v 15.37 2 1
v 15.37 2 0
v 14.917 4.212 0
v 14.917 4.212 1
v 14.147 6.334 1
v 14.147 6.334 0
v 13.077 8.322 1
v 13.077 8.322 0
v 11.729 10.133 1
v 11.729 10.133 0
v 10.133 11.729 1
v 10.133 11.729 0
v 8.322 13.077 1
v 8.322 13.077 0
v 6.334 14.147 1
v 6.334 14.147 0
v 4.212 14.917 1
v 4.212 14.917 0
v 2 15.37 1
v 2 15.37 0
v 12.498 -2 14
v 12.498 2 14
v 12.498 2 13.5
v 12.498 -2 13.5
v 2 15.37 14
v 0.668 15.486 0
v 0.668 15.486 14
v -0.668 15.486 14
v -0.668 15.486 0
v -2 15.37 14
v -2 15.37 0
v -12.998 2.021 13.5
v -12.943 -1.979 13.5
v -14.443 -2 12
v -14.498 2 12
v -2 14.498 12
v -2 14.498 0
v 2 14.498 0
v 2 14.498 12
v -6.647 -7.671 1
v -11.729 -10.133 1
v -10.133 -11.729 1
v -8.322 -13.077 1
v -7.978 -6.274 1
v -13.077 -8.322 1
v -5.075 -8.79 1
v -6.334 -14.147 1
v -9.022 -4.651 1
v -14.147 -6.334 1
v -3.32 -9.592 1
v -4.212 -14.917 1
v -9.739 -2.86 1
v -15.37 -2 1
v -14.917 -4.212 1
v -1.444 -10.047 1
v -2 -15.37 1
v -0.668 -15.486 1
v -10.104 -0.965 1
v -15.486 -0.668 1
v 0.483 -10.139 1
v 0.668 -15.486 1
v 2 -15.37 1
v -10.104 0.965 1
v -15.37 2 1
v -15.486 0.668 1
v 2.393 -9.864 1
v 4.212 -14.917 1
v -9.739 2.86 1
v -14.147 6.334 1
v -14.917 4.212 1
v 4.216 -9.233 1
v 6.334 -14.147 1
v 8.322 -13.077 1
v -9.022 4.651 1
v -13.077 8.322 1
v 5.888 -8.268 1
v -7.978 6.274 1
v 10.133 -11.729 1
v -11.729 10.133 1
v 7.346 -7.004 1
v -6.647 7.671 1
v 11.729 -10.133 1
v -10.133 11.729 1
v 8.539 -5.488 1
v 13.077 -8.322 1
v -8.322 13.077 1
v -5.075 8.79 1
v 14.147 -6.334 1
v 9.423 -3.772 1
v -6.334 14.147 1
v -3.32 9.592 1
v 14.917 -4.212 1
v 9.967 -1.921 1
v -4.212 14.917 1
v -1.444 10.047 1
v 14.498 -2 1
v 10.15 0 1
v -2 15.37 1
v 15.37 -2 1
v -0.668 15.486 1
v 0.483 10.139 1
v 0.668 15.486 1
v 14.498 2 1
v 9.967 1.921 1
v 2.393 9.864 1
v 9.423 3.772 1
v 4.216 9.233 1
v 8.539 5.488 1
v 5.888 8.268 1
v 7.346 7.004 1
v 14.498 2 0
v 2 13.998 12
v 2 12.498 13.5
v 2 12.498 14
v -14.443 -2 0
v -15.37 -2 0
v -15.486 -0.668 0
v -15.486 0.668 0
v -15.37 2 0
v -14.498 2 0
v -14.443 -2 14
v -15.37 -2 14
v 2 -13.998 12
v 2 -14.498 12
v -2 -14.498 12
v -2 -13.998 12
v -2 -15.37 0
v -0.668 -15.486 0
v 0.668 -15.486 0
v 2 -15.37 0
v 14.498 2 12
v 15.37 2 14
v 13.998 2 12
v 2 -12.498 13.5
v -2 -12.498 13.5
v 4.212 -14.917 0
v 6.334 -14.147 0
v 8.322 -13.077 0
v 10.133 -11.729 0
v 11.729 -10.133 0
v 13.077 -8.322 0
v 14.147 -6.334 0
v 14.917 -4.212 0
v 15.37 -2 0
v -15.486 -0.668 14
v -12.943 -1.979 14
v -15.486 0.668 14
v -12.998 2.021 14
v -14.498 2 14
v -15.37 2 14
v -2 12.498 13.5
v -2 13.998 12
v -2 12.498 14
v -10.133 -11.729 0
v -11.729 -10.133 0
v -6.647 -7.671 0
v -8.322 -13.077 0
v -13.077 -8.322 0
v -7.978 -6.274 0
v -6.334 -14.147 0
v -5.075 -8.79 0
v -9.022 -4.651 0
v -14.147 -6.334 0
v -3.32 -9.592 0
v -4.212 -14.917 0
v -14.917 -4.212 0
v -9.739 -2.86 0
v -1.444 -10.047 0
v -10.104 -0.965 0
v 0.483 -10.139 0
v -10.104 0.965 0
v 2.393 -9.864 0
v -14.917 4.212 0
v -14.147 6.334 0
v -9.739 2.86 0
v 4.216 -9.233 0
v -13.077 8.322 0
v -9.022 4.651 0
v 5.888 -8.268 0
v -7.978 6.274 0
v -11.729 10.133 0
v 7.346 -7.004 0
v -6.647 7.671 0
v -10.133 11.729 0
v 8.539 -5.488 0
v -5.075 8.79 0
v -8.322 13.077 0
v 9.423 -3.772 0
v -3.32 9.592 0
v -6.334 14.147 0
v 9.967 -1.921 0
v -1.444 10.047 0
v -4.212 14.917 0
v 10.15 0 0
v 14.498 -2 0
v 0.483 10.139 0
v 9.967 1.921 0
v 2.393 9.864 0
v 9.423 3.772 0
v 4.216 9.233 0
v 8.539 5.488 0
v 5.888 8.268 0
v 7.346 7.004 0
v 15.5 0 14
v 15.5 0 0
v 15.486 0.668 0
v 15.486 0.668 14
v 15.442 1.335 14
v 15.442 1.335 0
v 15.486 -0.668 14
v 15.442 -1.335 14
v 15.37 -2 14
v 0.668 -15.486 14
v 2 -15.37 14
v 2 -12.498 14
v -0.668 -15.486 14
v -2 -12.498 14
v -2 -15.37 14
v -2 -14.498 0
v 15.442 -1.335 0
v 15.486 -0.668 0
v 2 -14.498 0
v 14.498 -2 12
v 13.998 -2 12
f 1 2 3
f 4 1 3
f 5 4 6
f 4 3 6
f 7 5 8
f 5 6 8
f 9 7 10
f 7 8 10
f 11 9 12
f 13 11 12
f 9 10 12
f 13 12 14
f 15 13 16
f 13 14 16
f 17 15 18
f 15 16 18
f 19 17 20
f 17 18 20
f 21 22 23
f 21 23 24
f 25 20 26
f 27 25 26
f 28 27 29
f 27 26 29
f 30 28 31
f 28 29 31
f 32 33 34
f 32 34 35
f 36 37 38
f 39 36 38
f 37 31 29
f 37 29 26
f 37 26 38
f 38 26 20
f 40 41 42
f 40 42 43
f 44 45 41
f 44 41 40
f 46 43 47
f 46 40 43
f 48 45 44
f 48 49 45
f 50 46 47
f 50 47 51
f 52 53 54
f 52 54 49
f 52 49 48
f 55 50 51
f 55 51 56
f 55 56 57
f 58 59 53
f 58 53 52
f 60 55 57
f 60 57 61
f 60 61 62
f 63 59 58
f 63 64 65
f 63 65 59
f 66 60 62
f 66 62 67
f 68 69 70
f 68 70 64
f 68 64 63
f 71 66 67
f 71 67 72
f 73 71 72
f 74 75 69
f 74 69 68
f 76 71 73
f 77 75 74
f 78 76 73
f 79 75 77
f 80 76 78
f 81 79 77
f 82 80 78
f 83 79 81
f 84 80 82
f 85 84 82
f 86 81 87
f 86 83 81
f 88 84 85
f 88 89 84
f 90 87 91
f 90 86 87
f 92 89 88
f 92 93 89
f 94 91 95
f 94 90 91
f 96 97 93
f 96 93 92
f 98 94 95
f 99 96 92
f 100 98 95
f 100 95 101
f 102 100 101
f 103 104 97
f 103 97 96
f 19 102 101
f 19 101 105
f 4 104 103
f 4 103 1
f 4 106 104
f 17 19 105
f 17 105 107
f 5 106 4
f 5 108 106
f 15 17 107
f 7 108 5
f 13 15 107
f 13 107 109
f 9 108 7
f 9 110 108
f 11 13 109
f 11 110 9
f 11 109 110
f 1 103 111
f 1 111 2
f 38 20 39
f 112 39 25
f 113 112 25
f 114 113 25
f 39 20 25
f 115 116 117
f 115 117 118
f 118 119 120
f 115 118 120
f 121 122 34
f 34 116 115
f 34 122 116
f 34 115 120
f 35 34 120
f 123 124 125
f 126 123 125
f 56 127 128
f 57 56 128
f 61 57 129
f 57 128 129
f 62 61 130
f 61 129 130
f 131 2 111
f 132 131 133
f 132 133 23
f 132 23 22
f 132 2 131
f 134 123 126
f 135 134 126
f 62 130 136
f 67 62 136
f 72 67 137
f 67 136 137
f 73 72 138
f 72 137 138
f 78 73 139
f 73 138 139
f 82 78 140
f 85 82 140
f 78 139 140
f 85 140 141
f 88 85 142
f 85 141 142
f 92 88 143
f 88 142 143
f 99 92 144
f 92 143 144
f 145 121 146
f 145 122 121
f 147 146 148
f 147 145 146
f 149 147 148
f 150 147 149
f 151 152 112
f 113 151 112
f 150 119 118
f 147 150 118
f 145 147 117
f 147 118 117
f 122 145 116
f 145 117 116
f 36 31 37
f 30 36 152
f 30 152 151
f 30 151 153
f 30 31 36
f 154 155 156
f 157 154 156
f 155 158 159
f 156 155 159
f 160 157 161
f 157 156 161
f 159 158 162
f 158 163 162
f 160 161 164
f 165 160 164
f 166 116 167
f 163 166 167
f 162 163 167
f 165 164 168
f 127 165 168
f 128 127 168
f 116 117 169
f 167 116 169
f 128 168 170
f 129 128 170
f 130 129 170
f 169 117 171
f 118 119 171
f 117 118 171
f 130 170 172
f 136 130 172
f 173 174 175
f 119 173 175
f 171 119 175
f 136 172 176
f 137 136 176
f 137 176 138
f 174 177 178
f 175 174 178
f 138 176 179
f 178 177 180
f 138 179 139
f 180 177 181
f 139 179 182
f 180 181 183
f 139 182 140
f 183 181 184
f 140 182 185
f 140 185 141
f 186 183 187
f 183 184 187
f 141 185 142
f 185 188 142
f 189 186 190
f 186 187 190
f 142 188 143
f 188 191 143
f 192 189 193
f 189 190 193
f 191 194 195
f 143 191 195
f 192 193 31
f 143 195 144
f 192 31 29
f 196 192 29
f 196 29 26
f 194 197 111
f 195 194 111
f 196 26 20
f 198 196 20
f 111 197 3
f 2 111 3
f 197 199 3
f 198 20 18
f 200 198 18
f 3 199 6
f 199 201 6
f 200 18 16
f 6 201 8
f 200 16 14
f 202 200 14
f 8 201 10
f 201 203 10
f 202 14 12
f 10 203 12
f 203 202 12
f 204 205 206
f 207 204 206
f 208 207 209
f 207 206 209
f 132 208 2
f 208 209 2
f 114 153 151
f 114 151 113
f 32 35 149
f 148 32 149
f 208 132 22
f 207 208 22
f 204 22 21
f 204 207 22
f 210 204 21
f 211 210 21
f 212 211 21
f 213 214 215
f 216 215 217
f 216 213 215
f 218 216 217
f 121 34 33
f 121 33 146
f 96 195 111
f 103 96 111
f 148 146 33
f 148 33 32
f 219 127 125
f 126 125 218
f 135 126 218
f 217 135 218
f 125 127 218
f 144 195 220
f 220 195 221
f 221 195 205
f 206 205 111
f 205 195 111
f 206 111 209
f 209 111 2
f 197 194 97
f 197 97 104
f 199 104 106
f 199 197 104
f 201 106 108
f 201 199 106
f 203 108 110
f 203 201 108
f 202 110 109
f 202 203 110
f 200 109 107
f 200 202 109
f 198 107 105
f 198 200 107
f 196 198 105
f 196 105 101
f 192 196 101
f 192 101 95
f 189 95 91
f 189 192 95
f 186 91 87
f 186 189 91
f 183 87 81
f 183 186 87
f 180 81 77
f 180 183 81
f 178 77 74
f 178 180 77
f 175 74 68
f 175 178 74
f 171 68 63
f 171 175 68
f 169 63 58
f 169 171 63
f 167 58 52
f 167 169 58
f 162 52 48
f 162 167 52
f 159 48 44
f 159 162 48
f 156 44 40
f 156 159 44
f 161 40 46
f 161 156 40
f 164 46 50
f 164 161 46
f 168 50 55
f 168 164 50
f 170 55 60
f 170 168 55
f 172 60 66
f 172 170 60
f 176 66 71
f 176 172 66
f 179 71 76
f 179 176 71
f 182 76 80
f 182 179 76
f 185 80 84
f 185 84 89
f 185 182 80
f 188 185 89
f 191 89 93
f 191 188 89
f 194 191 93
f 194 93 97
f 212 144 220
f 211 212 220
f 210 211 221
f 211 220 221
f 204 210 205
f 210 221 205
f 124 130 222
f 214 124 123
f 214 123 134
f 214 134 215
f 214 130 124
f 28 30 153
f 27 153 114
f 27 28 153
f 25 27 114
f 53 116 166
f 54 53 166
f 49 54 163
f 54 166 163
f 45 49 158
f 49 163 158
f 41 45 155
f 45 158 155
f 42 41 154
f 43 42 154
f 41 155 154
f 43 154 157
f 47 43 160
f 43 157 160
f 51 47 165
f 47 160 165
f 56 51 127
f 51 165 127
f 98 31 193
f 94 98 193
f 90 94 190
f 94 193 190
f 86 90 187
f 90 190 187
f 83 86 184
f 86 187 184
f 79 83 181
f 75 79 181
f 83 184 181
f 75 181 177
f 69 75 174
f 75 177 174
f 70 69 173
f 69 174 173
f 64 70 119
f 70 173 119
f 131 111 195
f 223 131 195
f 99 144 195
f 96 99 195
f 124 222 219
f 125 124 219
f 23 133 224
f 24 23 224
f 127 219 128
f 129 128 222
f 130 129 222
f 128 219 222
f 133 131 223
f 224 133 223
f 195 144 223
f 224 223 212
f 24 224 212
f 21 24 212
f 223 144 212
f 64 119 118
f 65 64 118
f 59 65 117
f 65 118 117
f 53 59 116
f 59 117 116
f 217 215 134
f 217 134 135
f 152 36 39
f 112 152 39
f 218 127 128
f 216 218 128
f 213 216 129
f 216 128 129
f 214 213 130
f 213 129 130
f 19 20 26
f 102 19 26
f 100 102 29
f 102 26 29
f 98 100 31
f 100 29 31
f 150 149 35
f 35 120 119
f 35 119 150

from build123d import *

# Parameters (mm, degrees)
F1_DEPTH  = 14
F0_R      = 10.15
F2_DEPTH  = 1
F3_W      = 4
F3_H      = 2
F4_DEPTH  = 2
F5_SIZE   = 1.5
F6_W      = 4
F6_H      = 2
F7_DEPTH  = 2
F8_SIZE   = 1.5
F9_W      = 4.0003886693
F9_H      = 2
F10_DEPTH = 1.5
F11_SIZE  = 1.49999
F12_W     = 4
F12_H     = 2
F13_DEPTH = 2
F14_SIZE  = 1.5


# Not quite as in the source:
# - a fillet or chamfer is up to 0.001 mm smaller than in the source, because OpenCascade refuses the exact size
# - a feature names something its author has since deleted; it is built from what else it names


with BuildPart() as f1:
    # F0 (on Top) → F1 (new body)
    with BuildSketch(Plane.XY):
        with BuildLine():
            Line((-14.4982938511, 2), (-15.3704261489, 2))
            ThreePointArc((-15.3704261489, 2), (-15.5, 0), (-15.3704261489, -2))
            Line((-15.3704261489, -2), (-14.4425309095, -2))
            Line((-14.4425309095, -2), (-14.4982938511, 2))
        make_face()
    extrude(amount=F1_DEPTH)

    # F9 (on face) → F10 (join)
    with BuildSketch(Plane(origin=(-14.4676006874, -0.2016889929, 0), x_dir=(-0.0139393809, 0.9999028421, 0), z_dir=(0.9999028421, 0.0139393809, 0))):
        with Locations((0.2017085905, 13)):
            Rectangle(F9_W, F9_H)
    extrude(amount=F10_DEPTH)

    # F11 (size 1.5 in the source; OpenCascade refuses exactly that, so slightly less here)
    f11_edges = [f1.edges().sort_by_distance(p)[0] for p in [
        (-12.970558, 0.020909, 12),
    ]]
    chamfer(f11_edges, length=F11_SIZE)


with BuildPart() as f1b:
    # F0 (on Top) → F1, piece 2 (new body)
    with BuildSketch(Plane.XY):
        with BuildLine():
            ThreePointArc((-2, -15.3704261489), (0, -15.5), (2, -15.3704261489))
            Line((2, -15.3704261489), (2, -14.4982938511))
            Line((2, -14.4982938511), (-2, -14.4982938511))
            Line((-2, -14.4982938511), (-2, -15.3704261489))
        make_face()
    extrude(amount=F1_DEPTH)

    # F3 (on face) → F4 (join)
    with BuildSketch(Plane(origin=(0, -14.4982938511, 0), x_dir=(-1, 0, 0), z_dir=(0, 1, 0))):
        with Locations((0, 13)):
            Rectangle(F3_W, F3_H)
    extrude(amount=F4_DEPTH)

    # F5
    f5_edges = [f1b.edges().sort_by_distance(p)[0] for p in [
        (0, -12.498294, 12),
    ]]
    chamfer(f5_edges, length=F5_SIZE)


with BuildPart() as f1c:
    # F0 (on Top) → F1, piece 3 (new body)
    with BuildSketch(Plane.XY):
        with BuildLine():
            Line((2, 14.4982938511), (2, 15.3704261489))
            ThreePointArc((2, 15.3704261489), (0, 15.5), (-2, 15.3704261489))
            Line((-2, 15.3704261489), (-2, 14.4982938511))
            Line((-2, 14.4982938511), (2, 14.4982938511))
        make_face()
    extrude(amount=F1_DEPTH)

    # F6 (on face) → F7 (join)
    with BuildSketch(Plane.XZ.offset(-14.4982938511)):
        with Locations((0, 13)):
            Rectangle(F6_W, F6_H)
    extrude(amount=F7_DEPTH)

    # F8
    f8_edges = [f1c.edges().sort_by_distance(p)[0] for p in [
        (0, 12.498294, 12),
    ]]
    chamfer(f8_edges, length=F8_SIZE)


with BuildPart() as f1d:
    # F0 (on Top) → F1, piece 4 (new body)
    with BuildSketch(Plane.XY):
        with BuildLine():
            ThreePointArc((15.3704261489, -2), (15.4675726167, -1.0020964753), (15.5, 0))
            ThreePointArc((15.5, 0), (15.4675726167, 1.0020964753), (15.3704261489, 2))
            Line((15.3704261489, 2), (14.4982938511, 2))
            Line((14.4982938511, 2), (14.4982938511, -2))
            Line((14.4982938511, -2), (15.3704261489, -2))
        make_face()
    extrude(amount=F1_DEPTH)

    # F12 (on face) → F13 (join)
    with BuildSketch(Plane(origin=(14.4982938511, 0, 0), x_dir=(0, -1, 0), z_dir=(-1, 0, 0))):
        with Locations((0, 13)):
            Rectangle(F12_W, F12_H)
    extrude(amount=F13_DEPTH)

    # F14
    f14_edges = [f1d.edges().sort_by_distance(p)[0] for p in [
        (12.498294, 0, 12),
    ]]
    chamfer(f14_edges, length=F14_SIZE)


with BuildPart() as f2:
    # F0 (on Top) → F2 (new body)
    with BuildSketch(Plane.XY):
        with BuildLine():
            Line((2, 14.4982938511), (2, 15.3704261489))
            ThreePointArc((2, 15.3704261489), (0, 15.5), (-2, 15.3704261489))
            Line((-2, 15.3704261489), (-2, 14.4982938511))
            Line((-2, 14.4982938511), (2, 14.4982938511))
        make_face()
        with BuildLine():
            Line((-14.4982938511, 2), (-15.3704261489, 2))
            ThreePointArc((-15.3704261489, 2), (-15.5, 0), (-15.3704261489, -2))
            Line((-15.3704261489, -2), (-14.4425309095, -2))
            Line((-14.4425309095, -2), (-14.4982938511, 2))
        make_face()
        with BuildLine():
            Line((14.4982938511, 2), (15.3704261489, 2))
            ThreePointArc((15.3704261489, 2), (10.9601551084, 10.9601551084), (2, 15.3704261489))
            Line((2, 15.3704261489), (2, 14.4982938511))
            Line((2, 14.4982938511), (-2, 14.4982938511))
            Line((-2, 14.4982938511), (-2, 15.3704261489))
            ThreePointArc((-2, 15.3704261489), (-10.9601551084, 10.9601551084), (-15.3704261489, 2))
            Line((-15.3704261489, 2), (-14.4982938511, 2))
            Line((-14.4982938511, 2), (-14.4425309095, -2))
            Line((-14.4425309095, -2), (-15.3704261489, -2))
            ThreePointArc((-15.3704261489, -2), (-10.9601551084, -10.9601551084), (-2, -15.3704261489))
            Line((-2, -15.3704261489), (-2, -14.4982938511))
            Line((-2, -14.4982938511), (2, -14.4982938511))
            Line((2, -14.4982938511), (2, -15.3704261489))
            ThreePointArc((2, -15.3704261489), (10.9601551084, -10.9601551084), (15.3704261489, -2))
            Line((15.3704261489, -2), (14.4982938511, -2))
            Line((14.4982938511, -2), (14.4982938511, 2))
        make_face()
        Circle(F0_R, mode=Mode.SUBTRACT)
        with BuildLine():
            ThreePointArc((-2, -15.3704261489), (0, -15.5), (2, -15.3704261489))
            Line((2, -15.3704261489), (2, -14.4982938511))
            Line((2, -14.4982938511), (-2, -14.4982938511))
            Line((-2, -14.4982938511), (-2, -15.3704261489))
        make_face()
    extrude(amount=F2_DEPTH)


solid = Compound([f1.part, f1b.part, f1c.part, f1d.part, f2.part])
